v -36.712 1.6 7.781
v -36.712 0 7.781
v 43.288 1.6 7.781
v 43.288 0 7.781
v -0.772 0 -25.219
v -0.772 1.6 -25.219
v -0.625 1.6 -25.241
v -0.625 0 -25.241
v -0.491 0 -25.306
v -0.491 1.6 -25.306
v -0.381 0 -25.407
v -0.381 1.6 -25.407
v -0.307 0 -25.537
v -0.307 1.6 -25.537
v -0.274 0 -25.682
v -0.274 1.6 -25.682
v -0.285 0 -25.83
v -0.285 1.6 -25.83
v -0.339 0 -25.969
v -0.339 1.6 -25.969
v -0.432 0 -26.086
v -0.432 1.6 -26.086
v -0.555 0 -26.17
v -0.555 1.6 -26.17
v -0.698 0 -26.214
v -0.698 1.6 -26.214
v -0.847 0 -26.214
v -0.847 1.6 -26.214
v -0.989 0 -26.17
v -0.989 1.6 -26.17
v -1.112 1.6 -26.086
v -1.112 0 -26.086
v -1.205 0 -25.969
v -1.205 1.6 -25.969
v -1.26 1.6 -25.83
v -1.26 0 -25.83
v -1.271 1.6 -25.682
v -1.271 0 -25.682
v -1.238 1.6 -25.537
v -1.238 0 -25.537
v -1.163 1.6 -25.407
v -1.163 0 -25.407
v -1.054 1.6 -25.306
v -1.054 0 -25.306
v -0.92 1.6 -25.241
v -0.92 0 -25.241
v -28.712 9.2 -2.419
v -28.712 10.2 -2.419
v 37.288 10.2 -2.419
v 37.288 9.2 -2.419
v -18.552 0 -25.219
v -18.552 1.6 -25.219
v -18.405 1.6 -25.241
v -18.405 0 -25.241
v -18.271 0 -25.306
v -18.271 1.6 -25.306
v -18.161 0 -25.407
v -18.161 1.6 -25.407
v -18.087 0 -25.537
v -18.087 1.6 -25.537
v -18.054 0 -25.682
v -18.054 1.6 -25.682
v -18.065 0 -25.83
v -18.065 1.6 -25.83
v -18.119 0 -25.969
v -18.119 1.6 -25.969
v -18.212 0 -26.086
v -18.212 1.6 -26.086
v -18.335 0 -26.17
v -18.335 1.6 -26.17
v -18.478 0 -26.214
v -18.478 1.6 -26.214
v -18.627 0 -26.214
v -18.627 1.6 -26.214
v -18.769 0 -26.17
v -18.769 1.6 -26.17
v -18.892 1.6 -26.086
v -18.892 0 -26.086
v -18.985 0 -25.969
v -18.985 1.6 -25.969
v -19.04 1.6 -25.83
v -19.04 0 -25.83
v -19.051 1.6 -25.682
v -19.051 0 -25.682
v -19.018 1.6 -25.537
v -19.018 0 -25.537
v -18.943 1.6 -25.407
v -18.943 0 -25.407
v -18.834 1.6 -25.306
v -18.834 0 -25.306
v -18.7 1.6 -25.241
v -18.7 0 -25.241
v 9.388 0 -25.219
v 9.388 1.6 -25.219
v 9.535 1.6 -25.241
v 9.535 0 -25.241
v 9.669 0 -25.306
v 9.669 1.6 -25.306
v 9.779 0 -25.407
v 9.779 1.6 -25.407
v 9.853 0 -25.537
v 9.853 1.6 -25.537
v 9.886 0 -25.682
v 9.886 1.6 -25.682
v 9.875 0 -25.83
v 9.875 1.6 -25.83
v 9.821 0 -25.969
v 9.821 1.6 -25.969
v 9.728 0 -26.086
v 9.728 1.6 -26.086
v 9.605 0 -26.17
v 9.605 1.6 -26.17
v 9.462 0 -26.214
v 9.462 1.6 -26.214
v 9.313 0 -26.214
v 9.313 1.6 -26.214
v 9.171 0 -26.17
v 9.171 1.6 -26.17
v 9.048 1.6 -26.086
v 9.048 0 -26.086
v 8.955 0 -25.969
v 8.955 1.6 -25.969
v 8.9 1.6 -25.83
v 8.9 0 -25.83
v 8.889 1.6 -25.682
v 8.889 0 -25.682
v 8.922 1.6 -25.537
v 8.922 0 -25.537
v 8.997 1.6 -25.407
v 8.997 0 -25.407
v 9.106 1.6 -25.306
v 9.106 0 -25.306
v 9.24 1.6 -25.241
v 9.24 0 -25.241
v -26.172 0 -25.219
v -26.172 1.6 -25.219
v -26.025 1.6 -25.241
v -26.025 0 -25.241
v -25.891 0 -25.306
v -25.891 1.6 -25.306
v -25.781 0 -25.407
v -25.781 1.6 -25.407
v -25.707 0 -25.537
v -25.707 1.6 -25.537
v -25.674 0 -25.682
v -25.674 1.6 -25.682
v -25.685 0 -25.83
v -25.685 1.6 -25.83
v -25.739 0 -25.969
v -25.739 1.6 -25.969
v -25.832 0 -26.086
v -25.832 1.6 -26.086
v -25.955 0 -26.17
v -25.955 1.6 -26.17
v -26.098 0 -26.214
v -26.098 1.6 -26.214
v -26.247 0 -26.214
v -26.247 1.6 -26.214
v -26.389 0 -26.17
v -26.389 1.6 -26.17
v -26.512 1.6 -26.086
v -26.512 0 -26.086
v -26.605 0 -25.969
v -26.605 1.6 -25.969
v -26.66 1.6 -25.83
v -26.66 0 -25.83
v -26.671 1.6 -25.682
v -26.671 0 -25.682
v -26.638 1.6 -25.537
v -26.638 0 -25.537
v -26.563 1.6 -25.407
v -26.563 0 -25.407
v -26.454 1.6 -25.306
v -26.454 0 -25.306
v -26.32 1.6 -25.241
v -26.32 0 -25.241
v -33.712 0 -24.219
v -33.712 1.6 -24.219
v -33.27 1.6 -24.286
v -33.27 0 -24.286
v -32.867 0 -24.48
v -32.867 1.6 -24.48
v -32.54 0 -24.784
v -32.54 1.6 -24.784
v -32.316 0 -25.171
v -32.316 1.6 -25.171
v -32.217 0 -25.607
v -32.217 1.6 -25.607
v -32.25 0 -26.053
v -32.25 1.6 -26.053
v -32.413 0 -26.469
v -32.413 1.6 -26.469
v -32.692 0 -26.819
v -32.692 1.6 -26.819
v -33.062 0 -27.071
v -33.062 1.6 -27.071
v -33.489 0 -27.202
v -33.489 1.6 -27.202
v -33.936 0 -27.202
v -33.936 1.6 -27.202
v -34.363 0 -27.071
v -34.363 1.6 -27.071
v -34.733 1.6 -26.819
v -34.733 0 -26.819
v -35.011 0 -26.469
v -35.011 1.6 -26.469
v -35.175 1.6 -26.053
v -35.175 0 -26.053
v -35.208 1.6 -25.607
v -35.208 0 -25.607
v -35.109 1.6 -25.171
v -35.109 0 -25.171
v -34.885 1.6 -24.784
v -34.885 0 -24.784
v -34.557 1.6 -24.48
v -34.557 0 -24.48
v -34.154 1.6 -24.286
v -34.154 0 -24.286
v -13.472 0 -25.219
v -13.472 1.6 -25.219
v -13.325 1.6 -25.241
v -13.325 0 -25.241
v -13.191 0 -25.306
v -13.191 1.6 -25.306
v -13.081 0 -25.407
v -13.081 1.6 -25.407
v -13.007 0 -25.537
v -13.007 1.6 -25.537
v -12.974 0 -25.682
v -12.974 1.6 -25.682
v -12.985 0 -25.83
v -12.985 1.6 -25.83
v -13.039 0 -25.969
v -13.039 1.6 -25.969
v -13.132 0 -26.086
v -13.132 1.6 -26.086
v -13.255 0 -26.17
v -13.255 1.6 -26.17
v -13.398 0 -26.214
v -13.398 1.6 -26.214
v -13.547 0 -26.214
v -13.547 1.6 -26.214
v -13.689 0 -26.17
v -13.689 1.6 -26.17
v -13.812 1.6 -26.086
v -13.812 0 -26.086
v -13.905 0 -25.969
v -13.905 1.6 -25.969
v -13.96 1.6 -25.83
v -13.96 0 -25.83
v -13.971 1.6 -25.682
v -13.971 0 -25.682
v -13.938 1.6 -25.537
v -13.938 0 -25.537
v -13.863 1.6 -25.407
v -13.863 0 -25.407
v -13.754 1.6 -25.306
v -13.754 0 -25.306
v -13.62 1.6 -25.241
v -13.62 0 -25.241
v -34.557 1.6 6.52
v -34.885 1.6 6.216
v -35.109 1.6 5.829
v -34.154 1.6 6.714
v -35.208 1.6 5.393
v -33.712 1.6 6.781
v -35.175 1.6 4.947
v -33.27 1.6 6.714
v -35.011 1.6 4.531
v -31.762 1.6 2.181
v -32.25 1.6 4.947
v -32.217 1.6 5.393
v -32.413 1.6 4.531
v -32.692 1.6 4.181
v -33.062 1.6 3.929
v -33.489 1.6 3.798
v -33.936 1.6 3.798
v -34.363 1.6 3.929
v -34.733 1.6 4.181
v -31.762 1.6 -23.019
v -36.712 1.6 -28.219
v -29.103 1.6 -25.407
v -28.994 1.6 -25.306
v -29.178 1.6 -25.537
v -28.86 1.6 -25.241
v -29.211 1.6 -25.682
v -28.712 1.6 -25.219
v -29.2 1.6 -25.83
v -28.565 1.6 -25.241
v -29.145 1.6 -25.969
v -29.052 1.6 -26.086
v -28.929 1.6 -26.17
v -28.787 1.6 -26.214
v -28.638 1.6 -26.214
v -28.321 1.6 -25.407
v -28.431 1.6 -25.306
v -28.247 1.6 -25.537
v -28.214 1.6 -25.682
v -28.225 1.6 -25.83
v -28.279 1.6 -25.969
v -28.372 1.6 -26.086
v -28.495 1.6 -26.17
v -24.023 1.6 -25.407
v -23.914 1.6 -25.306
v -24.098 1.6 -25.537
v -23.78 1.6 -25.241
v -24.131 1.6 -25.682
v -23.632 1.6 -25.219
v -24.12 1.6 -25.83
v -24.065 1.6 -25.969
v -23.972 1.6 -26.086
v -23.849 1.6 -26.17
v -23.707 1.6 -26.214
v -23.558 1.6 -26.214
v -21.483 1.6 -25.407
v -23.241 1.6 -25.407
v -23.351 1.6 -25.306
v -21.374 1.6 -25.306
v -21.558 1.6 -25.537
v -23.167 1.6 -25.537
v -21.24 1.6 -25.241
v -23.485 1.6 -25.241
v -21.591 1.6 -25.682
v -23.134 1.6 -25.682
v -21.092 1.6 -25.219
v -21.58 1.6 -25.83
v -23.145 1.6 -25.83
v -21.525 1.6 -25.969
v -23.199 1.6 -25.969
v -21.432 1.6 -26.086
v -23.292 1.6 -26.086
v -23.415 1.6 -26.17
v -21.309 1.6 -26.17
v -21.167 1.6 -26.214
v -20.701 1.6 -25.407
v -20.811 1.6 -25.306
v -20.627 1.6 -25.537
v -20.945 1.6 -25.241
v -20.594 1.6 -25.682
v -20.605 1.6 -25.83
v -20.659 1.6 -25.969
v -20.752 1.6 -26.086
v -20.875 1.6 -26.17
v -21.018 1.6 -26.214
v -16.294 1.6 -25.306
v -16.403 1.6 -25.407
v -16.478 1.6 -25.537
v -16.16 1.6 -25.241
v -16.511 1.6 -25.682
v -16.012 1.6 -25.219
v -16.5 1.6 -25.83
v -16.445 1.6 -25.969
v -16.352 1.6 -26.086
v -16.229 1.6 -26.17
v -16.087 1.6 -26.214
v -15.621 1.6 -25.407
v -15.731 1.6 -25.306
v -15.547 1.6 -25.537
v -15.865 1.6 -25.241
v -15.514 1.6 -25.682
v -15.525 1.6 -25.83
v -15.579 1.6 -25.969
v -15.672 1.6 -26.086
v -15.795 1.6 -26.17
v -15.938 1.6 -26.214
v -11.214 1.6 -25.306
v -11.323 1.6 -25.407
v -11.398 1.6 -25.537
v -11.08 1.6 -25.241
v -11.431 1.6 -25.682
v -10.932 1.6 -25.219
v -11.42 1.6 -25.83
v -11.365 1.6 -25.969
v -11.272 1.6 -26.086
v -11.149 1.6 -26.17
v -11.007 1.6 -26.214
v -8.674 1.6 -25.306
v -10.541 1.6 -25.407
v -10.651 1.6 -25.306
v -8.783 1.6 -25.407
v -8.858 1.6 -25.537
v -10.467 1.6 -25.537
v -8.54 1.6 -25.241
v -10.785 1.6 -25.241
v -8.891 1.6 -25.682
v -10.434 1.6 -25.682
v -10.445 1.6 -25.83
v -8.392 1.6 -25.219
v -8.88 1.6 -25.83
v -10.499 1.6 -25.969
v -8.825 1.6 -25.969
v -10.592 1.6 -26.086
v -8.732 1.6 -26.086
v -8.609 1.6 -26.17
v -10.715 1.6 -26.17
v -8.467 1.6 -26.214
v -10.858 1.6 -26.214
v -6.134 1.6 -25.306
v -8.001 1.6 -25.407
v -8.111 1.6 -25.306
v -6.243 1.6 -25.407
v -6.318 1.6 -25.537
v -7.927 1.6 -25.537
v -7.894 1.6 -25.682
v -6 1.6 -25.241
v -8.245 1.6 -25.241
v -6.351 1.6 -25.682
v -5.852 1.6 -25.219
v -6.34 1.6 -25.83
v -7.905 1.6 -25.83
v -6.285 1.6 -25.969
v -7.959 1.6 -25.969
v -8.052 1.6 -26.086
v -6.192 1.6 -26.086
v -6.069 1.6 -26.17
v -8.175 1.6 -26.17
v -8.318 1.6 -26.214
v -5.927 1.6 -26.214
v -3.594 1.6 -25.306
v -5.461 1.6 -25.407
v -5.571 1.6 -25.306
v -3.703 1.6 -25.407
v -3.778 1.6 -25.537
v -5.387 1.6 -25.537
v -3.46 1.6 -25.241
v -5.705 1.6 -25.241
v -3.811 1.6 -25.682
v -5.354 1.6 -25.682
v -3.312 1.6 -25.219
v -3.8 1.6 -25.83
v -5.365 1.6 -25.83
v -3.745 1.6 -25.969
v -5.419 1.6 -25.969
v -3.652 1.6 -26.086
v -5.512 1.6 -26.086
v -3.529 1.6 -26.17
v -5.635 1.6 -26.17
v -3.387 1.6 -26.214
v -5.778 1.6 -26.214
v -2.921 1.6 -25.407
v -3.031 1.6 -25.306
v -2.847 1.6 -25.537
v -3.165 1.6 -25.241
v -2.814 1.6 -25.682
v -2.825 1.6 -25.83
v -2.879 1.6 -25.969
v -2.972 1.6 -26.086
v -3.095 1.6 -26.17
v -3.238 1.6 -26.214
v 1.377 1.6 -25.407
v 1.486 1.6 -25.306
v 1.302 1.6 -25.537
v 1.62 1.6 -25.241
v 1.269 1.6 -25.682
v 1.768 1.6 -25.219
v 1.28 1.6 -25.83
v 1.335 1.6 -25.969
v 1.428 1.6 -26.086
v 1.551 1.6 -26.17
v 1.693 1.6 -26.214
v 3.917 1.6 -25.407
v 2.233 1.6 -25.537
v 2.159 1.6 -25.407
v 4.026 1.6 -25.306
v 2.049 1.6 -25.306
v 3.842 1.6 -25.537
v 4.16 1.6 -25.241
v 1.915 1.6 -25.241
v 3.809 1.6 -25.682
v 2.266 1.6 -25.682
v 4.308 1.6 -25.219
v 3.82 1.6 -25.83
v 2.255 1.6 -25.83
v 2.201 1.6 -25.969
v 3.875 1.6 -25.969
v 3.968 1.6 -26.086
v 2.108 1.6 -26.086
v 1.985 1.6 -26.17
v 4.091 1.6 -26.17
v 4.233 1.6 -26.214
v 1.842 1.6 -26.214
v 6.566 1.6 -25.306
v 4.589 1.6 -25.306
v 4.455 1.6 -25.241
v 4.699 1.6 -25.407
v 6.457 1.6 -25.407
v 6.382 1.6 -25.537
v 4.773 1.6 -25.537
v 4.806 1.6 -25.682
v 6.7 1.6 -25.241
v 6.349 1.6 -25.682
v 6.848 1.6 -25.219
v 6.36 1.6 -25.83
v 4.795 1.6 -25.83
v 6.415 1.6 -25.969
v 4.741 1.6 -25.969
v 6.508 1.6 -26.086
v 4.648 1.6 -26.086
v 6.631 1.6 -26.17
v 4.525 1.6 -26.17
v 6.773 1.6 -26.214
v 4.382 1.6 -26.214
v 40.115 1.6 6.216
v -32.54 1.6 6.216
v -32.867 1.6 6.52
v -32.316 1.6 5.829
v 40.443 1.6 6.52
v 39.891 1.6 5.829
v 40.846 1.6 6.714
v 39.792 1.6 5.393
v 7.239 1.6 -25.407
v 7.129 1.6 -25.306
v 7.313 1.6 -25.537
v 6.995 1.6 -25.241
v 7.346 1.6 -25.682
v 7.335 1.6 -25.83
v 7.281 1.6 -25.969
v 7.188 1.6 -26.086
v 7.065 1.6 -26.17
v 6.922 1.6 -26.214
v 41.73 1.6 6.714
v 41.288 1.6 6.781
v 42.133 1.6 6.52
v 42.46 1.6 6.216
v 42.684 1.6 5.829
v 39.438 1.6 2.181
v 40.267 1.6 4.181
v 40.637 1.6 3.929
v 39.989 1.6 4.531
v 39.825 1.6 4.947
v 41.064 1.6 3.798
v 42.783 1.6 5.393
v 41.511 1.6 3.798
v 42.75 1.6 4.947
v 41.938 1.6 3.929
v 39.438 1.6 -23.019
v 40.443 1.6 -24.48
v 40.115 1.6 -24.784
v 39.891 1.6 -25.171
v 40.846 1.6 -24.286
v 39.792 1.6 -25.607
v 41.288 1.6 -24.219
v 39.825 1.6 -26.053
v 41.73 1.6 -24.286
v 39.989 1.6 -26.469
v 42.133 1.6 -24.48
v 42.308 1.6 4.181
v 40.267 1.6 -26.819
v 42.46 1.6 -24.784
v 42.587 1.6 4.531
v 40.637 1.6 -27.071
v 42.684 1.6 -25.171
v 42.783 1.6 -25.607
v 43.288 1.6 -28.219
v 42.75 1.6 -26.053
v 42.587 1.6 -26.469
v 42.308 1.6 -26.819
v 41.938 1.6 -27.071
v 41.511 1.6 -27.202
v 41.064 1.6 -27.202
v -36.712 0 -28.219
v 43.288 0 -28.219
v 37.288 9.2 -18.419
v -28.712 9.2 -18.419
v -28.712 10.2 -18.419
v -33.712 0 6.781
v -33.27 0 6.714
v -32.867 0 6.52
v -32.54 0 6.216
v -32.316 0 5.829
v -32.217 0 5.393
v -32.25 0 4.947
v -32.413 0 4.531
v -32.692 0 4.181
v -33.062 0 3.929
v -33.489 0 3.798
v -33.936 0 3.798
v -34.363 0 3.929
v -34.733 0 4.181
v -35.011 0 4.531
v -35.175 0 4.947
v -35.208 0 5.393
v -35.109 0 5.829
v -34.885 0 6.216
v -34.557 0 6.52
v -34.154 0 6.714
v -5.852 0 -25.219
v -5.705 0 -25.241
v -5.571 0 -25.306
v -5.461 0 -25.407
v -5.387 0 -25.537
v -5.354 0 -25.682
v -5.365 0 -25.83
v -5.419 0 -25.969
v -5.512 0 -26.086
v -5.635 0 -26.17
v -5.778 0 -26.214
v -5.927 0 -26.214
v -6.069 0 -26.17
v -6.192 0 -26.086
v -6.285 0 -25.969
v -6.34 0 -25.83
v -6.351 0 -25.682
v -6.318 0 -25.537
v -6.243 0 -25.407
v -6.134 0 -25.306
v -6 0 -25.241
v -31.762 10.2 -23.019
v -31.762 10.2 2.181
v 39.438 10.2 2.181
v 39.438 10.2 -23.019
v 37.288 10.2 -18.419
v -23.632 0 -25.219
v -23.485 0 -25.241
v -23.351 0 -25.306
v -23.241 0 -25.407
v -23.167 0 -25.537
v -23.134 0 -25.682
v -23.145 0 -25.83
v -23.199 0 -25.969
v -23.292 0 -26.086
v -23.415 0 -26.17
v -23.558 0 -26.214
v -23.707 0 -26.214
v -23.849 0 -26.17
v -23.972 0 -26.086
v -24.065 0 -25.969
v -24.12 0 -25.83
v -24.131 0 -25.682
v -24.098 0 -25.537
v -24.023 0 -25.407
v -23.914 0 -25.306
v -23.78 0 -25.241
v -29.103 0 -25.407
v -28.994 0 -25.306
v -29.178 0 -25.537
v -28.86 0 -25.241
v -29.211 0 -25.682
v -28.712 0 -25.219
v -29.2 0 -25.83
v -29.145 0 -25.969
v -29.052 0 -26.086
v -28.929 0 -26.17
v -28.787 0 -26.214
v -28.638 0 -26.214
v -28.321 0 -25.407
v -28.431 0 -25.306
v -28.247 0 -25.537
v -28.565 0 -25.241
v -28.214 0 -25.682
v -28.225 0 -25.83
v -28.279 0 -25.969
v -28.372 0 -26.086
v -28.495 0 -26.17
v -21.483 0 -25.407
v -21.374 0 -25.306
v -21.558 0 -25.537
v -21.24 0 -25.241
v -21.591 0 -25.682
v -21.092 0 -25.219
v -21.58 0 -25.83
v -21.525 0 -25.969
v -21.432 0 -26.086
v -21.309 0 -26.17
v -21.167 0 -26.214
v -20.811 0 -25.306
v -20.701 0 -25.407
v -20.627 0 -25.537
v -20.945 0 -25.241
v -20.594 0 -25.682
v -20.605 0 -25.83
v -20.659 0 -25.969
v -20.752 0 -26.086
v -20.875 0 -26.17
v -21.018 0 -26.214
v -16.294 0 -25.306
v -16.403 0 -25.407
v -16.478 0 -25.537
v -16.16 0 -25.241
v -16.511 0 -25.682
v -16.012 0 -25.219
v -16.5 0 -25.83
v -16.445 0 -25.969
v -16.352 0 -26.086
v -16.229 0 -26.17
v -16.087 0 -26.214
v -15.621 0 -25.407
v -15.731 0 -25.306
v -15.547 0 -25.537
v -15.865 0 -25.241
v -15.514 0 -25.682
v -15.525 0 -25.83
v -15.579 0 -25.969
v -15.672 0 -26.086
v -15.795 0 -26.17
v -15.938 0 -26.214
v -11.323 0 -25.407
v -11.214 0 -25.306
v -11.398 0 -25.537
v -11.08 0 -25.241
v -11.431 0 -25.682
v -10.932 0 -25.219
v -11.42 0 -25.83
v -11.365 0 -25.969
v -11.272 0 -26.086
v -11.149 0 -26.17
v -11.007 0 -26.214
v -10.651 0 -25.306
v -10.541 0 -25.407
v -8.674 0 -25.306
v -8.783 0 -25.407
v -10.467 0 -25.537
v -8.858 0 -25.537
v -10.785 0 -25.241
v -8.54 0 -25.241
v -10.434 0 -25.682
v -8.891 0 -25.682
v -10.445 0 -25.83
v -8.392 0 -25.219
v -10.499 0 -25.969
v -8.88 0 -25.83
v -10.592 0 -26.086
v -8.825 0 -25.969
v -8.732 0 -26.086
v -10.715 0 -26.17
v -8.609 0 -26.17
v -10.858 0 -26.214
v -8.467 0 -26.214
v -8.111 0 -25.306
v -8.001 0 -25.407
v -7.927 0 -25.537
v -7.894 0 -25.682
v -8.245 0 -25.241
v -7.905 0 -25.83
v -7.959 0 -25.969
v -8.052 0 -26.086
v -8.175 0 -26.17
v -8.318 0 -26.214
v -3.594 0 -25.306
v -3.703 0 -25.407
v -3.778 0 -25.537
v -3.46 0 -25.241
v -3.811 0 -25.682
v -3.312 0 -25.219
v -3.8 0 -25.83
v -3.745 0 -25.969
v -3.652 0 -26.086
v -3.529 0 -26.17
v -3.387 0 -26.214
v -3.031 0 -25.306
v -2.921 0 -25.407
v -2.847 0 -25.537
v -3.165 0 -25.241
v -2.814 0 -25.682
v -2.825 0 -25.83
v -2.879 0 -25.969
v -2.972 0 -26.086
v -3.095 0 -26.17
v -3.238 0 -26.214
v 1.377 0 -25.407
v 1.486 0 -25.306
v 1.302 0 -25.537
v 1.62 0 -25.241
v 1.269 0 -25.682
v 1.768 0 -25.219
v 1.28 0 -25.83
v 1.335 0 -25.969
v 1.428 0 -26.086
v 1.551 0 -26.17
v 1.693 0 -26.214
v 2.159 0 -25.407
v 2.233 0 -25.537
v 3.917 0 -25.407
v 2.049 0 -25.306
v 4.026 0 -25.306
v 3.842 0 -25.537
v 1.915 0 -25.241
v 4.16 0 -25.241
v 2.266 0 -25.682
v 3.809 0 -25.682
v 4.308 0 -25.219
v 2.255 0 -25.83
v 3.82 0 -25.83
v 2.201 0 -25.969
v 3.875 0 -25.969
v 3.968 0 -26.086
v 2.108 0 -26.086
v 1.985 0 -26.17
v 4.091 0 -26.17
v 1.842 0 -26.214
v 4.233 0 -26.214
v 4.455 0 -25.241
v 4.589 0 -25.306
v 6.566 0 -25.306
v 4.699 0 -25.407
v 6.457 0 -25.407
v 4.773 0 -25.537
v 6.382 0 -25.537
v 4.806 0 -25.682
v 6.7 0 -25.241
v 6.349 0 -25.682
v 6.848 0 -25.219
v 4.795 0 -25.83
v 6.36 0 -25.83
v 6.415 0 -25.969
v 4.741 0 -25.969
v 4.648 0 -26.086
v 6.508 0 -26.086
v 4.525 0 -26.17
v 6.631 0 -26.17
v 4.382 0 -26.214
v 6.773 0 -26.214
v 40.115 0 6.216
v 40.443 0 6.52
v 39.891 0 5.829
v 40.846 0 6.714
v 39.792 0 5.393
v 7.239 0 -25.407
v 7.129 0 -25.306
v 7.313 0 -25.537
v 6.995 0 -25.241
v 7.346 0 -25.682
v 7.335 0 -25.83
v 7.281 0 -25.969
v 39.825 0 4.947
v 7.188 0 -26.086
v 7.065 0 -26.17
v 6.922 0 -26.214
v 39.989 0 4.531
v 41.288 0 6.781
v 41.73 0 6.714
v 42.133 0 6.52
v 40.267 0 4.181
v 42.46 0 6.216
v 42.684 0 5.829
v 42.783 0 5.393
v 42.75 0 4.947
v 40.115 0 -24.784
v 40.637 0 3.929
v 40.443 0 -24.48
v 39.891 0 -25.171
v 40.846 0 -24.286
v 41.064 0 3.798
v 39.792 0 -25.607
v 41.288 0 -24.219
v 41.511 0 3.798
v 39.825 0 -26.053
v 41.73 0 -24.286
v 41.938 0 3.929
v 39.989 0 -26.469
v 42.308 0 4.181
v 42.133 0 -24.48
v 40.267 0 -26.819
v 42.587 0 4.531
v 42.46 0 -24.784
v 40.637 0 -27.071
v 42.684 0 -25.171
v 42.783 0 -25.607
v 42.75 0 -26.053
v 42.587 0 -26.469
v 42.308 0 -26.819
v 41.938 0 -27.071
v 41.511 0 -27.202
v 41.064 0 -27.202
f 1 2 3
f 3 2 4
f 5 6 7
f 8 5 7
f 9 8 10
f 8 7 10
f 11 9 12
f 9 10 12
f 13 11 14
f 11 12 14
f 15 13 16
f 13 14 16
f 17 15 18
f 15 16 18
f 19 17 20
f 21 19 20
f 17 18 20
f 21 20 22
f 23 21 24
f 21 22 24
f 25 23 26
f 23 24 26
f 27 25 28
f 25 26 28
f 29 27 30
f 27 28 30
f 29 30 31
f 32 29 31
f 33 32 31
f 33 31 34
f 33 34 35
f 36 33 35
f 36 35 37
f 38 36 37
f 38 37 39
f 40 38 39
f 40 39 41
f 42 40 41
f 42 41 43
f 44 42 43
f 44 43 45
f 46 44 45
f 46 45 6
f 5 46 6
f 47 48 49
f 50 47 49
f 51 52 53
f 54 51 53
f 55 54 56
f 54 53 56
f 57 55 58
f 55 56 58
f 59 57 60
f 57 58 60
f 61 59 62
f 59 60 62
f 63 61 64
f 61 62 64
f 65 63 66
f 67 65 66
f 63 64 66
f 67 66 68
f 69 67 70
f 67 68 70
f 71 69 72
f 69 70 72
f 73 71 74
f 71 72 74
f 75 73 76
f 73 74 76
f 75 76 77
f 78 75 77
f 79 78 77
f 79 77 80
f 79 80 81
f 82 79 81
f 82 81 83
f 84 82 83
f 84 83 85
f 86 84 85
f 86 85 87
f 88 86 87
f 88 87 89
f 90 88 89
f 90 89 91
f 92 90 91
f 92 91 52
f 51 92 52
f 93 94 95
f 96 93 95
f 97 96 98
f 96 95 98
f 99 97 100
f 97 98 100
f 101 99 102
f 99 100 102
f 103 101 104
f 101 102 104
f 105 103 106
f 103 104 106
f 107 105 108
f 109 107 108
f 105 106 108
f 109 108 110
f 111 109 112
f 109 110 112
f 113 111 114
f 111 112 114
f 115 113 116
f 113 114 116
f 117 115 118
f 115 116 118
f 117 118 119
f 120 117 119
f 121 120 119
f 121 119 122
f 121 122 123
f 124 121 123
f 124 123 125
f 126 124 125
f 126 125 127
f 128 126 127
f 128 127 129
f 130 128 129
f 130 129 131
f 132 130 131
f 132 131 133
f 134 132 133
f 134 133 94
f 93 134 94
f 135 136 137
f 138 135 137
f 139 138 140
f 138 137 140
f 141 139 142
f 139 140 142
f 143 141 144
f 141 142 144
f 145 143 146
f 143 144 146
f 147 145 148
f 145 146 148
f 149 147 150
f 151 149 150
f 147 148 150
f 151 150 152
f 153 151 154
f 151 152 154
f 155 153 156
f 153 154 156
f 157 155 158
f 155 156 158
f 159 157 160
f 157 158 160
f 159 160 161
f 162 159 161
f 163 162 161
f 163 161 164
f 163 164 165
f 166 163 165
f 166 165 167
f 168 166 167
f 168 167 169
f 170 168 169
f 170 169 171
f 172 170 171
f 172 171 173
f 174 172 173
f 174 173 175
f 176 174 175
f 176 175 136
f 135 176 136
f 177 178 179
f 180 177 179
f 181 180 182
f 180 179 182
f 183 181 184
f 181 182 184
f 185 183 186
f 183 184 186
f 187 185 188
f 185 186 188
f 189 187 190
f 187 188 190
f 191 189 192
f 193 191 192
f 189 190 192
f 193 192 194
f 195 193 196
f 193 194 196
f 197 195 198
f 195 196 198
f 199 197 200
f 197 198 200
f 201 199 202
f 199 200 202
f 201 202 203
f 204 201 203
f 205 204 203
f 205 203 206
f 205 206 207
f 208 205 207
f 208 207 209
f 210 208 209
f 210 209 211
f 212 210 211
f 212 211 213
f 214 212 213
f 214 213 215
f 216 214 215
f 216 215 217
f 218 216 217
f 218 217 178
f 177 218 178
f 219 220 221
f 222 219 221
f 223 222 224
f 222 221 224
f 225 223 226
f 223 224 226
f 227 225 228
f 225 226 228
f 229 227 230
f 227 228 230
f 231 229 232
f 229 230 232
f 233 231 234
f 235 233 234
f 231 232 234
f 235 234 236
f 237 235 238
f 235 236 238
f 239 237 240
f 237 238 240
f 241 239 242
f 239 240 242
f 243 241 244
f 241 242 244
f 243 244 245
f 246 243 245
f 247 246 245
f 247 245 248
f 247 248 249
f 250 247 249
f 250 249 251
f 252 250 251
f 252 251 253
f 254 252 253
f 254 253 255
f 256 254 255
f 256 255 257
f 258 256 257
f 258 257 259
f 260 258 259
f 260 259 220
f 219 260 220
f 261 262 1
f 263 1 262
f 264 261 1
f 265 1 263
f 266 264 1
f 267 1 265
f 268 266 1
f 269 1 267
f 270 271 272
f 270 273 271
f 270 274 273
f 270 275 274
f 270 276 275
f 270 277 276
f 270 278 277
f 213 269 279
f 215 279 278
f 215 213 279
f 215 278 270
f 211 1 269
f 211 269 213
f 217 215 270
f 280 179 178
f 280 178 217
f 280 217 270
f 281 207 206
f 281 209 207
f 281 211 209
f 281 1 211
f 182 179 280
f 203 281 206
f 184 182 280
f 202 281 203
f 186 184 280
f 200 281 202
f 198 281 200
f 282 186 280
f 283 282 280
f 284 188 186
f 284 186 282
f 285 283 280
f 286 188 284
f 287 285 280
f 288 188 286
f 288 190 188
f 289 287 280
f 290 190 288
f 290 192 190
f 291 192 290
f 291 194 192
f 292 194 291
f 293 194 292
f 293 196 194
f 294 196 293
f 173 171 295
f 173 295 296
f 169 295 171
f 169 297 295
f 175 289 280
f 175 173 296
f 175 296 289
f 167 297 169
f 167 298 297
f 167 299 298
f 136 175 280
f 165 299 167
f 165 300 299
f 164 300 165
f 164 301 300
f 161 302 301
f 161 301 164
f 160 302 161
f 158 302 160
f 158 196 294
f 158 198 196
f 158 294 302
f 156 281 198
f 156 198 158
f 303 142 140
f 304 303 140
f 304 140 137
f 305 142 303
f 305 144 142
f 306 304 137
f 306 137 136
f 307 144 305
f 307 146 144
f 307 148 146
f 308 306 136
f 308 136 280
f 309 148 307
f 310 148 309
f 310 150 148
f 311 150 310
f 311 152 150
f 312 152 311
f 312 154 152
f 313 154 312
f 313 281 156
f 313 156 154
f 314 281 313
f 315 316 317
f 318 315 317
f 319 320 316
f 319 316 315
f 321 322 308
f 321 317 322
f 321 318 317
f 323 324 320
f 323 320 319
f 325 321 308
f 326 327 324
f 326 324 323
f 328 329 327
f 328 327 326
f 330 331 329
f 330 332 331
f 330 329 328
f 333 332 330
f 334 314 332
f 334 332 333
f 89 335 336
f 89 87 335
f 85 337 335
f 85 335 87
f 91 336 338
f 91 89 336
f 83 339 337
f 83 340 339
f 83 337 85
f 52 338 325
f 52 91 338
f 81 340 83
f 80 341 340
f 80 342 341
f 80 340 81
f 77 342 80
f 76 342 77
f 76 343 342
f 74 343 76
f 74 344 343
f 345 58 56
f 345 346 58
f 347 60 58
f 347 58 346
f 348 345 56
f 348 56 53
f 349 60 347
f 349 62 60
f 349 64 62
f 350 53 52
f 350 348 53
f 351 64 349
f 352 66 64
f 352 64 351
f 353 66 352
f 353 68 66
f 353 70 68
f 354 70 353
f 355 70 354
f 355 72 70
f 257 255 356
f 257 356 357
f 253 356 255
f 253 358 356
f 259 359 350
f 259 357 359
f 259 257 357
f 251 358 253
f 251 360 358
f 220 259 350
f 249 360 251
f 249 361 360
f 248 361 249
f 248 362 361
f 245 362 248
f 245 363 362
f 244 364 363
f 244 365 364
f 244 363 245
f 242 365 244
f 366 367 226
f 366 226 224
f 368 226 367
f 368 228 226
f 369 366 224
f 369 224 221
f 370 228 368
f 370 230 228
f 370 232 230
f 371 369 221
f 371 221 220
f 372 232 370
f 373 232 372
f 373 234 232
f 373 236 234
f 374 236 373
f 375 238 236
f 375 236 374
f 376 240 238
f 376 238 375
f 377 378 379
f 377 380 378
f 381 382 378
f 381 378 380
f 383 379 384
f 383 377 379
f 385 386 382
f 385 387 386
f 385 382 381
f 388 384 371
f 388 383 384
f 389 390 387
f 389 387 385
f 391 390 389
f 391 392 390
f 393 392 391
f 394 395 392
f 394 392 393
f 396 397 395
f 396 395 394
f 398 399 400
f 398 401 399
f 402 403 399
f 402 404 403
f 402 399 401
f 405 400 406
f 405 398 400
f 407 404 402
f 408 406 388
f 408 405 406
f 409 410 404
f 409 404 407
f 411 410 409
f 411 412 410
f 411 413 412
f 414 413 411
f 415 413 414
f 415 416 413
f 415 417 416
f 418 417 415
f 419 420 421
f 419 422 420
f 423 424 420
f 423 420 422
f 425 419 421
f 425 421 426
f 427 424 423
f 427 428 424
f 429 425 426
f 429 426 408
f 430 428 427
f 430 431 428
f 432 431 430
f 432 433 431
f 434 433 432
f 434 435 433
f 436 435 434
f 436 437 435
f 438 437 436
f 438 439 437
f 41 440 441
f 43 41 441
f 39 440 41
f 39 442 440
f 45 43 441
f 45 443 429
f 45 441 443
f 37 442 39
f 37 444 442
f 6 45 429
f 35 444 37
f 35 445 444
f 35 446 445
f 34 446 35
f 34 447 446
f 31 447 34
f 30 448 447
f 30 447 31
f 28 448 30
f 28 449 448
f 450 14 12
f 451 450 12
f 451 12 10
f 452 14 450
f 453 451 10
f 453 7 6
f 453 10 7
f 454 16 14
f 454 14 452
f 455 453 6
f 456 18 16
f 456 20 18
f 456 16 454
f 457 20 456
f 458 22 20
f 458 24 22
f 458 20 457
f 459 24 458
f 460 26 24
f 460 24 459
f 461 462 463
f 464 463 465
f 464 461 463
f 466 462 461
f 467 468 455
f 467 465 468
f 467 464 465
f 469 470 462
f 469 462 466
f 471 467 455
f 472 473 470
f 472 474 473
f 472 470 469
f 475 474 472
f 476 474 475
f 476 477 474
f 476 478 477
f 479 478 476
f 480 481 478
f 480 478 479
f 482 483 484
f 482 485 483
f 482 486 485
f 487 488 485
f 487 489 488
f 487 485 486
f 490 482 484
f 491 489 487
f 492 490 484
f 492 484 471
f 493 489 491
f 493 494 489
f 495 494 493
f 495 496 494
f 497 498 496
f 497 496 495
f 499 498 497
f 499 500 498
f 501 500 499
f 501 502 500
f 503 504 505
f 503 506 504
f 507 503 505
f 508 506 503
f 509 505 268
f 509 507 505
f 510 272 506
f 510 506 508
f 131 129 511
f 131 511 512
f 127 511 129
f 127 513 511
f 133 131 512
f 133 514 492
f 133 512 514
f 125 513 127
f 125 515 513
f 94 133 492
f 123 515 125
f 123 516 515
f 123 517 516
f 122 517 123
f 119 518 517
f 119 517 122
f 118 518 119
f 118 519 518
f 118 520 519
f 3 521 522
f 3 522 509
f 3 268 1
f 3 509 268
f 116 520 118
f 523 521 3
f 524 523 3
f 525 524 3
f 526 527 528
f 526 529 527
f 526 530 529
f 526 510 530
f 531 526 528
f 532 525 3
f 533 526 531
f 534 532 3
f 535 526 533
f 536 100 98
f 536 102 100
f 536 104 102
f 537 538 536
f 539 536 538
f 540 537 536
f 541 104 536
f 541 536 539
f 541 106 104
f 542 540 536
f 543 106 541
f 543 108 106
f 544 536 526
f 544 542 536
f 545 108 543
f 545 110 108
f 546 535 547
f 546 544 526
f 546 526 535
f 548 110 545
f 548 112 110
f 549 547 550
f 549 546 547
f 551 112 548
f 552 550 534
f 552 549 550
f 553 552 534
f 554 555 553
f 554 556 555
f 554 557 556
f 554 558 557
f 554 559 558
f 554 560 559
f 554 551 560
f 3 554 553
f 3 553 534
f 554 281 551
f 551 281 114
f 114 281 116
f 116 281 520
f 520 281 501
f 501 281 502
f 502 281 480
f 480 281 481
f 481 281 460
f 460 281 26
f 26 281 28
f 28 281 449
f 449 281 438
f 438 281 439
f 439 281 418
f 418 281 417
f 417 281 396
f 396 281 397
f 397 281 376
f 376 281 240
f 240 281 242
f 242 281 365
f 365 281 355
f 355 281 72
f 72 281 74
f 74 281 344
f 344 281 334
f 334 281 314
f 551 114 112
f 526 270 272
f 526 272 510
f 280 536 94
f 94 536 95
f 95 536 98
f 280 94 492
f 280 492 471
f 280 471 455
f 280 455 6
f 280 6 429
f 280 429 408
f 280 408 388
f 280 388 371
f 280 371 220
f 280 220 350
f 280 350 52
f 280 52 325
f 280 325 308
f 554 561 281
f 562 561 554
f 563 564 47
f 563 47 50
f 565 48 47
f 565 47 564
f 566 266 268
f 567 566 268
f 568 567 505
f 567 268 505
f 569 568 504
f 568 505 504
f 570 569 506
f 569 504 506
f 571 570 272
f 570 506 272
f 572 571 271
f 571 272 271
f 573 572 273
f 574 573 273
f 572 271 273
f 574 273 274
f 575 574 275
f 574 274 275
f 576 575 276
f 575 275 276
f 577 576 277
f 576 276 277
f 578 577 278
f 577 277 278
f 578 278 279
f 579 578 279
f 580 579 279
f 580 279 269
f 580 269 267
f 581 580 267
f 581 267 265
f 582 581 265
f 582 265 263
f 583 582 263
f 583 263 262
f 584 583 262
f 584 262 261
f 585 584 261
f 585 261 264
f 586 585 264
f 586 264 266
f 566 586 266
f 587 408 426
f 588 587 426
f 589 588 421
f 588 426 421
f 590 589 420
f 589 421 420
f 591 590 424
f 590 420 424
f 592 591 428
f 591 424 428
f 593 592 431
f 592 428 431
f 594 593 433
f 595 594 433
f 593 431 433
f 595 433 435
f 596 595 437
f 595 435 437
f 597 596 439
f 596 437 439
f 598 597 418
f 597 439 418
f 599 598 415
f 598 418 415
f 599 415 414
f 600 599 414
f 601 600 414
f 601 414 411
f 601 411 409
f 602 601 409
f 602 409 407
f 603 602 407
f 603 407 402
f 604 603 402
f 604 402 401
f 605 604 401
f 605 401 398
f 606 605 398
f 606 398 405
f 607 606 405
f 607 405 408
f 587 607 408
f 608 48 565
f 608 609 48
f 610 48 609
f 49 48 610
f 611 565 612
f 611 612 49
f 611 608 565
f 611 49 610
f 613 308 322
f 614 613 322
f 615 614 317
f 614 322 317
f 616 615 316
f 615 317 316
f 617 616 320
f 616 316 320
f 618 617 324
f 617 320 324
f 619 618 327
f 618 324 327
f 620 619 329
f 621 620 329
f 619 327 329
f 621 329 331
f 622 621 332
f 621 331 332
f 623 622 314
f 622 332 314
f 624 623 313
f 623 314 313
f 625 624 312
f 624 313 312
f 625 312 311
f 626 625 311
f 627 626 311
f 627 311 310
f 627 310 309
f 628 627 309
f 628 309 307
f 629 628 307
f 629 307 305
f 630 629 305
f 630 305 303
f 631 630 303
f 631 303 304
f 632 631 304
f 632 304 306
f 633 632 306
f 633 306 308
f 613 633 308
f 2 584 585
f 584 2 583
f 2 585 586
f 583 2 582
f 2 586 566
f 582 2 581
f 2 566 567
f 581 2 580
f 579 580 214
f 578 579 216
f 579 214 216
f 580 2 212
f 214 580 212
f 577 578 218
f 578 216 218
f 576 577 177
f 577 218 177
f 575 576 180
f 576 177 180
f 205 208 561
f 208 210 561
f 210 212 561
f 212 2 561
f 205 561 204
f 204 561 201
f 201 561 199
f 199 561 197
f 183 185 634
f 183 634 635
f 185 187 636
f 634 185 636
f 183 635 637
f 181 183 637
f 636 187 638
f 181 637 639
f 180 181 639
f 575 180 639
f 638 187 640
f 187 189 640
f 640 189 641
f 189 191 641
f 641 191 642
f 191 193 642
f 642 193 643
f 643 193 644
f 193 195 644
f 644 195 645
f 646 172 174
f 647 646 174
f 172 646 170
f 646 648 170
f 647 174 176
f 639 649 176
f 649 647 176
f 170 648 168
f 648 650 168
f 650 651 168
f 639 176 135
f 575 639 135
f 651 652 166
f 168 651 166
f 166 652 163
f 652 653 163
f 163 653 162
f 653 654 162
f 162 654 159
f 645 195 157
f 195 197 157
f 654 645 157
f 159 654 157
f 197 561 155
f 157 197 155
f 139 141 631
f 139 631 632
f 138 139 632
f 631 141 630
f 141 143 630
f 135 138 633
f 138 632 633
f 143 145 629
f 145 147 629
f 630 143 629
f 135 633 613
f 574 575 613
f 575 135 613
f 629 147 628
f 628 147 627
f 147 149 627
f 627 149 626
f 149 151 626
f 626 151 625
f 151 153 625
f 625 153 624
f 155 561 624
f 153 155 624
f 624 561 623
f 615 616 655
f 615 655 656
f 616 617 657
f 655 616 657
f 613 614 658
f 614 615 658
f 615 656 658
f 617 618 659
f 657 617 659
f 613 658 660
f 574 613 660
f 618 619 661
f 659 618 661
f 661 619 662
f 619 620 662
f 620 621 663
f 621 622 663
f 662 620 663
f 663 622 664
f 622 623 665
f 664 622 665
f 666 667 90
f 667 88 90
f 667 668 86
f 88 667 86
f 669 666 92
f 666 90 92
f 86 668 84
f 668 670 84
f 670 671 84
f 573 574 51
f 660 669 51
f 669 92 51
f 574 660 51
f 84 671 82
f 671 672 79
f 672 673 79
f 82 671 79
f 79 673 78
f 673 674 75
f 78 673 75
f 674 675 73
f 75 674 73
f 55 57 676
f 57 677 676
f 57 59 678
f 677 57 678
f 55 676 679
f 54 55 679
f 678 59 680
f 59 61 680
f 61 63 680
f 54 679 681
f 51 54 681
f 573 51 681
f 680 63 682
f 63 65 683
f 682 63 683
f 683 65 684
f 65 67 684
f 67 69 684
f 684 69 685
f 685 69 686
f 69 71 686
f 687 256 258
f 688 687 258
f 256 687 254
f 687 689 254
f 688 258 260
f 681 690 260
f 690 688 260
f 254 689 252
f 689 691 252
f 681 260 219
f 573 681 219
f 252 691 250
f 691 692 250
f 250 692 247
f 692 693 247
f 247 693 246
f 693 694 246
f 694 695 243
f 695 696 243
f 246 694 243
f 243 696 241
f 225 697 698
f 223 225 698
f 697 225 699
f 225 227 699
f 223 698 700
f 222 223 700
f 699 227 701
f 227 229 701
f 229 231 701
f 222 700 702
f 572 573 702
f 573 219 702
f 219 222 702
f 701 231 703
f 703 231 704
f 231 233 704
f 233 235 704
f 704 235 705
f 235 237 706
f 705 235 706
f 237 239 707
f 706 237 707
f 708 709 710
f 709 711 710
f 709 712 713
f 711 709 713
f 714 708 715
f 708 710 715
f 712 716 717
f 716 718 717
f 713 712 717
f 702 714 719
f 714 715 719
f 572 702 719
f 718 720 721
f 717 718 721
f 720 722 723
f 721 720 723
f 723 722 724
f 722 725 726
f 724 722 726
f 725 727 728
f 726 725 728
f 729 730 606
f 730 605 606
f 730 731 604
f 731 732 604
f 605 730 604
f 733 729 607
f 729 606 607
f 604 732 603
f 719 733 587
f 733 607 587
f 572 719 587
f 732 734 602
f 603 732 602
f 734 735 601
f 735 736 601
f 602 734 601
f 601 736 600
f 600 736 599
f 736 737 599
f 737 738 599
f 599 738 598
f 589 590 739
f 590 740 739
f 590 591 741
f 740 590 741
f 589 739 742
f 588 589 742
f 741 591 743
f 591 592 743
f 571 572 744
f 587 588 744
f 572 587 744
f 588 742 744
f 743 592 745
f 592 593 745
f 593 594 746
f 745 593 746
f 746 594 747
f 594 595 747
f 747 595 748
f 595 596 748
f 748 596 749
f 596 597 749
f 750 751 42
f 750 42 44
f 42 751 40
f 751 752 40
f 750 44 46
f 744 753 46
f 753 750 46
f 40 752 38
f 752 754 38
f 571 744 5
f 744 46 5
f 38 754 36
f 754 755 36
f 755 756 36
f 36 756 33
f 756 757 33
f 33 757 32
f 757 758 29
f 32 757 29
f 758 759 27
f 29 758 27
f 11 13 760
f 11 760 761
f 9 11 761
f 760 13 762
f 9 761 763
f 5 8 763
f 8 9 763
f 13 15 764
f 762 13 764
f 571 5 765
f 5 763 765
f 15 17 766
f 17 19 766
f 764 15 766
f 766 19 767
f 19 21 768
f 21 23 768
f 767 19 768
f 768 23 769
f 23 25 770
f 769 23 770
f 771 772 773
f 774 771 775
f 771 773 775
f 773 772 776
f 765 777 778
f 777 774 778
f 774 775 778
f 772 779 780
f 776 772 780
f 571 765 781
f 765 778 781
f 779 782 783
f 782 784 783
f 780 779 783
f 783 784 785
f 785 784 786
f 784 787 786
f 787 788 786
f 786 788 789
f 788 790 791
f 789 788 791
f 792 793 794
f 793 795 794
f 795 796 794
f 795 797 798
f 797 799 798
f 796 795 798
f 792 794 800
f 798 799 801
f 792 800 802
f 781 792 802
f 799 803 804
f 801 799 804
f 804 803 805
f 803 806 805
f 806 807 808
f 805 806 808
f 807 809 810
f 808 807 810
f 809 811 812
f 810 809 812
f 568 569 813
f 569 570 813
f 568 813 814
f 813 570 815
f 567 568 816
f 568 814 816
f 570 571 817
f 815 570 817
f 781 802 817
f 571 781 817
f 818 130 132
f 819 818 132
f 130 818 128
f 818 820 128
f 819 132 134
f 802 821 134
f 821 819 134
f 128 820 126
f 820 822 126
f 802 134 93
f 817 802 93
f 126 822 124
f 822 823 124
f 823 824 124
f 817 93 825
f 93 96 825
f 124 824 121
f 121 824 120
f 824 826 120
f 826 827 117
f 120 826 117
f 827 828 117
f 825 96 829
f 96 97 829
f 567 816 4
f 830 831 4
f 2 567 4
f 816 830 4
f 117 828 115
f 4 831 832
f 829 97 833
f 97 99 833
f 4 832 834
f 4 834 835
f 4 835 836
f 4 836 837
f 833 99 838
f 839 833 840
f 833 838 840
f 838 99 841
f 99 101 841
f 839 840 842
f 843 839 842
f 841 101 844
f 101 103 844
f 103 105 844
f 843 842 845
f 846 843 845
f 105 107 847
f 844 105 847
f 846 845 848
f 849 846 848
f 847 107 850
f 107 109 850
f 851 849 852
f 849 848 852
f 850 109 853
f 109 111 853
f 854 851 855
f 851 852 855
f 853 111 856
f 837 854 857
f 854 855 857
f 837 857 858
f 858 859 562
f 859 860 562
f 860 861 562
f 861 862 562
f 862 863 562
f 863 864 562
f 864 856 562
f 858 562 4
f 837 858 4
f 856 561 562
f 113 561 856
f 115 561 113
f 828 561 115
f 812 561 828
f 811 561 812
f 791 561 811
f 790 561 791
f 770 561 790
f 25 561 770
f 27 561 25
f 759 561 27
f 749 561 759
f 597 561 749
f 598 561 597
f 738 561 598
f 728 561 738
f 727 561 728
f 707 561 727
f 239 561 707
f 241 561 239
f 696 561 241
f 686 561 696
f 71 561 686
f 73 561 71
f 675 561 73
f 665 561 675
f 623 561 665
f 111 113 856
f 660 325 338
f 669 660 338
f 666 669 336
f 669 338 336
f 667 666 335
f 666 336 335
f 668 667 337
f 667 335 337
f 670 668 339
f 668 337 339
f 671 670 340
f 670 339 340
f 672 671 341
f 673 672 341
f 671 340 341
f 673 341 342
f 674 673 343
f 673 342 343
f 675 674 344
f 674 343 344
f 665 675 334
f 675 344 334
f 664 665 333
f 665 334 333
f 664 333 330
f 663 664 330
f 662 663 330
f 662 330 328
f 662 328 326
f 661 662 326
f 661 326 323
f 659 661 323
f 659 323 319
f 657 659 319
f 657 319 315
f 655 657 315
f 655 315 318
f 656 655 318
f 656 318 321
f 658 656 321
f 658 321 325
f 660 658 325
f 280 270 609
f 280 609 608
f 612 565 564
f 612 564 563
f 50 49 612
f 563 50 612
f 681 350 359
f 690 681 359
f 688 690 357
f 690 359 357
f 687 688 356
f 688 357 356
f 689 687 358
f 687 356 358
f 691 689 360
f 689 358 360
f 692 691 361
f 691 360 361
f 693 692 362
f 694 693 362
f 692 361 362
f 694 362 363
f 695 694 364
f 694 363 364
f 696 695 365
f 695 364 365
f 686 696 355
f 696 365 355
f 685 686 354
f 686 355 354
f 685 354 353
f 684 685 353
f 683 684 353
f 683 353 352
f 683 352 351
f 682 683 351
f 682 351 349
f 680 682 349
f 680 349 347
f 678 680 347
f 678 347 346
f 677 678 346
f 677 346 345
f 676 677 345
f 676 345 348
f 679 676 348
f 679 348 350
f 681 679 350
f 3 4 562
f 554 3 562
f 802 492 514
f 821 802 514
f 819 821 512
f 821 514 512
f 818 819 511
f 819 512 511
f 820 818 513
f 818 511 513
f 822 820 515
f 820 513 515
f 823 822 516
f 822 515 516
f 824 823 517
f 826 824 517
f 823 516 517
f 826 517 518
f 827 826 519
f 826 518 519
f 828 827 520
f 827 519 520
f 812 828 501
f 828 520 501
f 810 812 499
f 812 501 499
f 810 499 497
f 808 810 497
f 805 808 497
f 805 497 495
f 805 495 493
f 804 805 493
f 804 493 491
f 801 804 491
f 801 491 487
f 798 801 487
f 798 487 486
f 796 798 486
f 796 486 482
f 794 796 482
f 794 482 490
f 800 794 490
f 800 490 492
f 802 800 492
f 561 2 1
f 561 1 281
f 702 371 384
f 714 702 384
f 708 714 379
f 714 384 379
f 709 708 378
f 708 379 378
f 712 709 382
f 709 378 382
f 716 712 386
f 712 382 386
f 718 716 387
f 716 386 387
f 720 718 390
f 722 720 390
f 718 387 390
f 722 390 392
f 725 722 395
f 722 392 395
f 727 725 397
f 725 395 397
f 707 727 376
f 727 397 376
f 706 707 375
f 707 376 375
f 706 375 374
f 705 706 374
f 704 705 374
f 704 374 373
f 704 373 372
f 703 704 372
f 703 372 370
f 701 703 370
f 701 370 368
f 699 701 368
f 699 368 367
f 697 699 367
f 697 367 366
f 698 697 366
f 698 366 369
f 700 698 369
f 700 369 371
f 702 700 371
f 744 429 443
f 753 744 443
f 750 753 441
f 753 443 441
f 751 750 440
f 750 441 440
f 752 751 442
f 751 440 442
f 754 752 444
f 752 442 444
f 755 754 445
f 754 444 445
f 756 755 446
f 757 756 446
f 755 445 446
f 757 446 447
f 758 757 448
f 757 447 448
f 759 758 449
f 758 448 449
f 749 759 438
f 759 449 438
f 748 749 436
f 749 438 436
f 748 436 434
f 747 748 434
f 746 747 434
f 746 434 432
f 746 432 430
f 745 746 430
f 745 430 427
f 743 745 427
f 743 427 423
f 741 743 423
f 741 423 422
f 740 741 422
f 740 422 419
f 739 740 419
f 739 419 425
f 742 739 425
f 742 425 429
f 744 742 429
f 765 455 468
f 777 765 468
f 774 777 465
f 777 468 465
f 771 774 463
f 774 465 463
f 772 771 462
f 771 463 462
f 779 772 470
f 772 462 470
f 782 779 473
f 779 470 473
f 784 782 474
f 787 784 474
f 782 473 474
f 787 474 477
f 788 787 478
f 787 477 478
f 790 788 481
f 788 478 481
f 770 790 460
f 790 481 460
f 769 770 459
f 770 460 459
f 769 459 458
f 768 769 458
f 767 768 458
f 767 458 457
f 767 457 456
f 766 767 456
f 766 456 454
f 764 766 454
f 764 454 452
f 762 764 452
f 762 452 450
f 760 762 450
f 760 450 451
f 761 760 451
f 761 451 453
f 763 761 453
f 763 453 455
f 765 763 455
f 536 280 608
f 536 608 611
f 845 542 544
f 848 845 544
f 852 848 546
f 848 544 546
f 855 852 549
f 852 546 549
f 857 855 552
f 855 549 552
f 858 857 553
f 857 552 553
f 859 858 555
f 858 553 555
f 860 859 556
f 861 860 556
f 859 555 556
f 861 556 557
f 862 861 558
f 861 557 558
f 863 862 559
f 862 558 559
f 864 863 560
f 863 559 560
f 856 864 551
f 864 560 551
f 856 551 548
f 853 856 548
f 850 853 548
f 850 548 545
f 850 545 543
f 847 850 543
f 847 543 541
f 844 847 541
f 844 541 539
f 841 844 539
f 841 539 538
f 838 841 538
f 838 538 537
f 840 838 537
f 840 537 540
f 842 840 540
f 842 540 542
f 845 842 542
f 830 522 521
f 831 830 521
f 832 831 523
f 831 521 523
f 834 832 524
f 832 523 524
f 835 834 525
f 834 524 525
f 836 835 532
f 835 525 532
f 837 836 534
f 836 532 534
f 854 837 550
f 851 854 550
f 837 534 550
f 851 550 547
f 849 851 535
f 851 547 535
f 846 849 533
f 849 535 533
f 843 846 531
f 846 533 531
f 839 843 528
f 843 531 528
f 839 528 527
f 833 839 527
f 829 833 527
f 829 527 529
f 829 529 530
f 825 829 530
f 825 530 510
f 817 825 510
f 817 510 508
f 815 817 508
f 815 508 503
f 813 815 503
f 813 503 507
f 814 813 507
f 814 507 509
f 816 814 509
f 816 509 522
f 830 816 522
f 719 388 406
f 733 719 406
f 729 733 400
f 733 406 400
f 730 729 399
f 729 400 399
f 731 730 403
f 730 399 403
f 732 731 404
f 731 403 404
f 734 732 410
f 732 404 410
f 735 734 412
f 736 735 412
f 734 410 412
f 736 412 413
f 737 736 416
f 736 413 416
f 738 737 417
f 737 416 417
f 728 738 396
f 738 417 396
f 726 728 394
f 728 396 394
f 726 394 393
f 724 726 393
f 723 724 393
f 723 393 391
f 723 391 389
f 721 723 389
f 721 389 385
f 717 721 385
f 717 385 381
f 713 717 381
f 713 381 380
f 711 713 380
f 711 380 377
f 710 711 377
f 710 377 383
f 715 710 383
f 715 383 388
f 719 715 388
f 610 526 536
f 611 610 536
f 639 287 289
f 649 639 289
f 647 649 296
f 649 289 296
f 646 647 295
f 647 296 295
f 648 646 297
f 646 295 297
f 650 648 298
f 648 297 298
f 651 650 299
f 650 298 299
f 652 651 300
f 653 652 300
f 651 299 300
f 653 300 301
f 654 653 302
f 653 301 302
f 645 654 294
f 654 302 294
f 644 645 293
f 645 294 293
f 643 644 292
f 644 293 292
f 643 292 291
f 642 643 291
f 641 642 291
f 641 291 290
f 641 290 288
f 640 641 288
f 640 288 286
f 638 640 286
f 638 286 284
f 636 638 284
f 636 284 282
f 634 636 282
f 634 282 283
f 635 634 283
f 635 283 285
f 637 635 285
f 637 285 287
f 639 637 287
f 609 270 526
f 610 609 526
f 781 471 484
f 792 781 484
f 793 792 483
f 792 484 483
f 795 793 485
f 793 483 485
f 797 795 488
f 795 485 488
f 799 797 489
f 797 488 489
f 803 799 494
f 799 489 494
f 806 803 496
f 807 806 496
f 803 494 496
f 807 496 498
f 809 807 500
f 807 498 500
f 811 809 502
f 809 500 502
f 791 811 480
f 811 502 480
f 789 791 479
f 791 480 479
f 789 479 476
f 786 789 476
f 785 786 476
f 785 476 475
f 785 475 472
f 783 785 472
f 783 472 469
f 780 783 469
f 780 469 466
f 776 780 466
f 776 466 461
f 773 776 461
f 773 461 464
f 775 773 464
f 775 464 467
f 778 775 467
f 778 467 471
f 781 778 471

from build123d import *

# Parameters (mm, degrees)
SKETCH1_W           = 80
SKETCH1_H           = 36
BOSS_EXTRUDE1_DEPTH = 1.6
SKETCH2_W           = 71.2
SKETCH2_H           = 25.2
BOSS_EXTRUDE2_DEPTH = 8.6
SKETCH3_R           = 1.5
CUT_EXTRUDE3_DEPTH  = 13.2
SKETCH6_W           = 66
SKETCH6_H           = 16
CUT_EXTRUDE4_DEPTH  = 1
SKETCH7_R           = 0.5
CUT_EXTRUDE5_DEPTH  = 21


with BuildPart() as part:
    # Sketch1 → Boss-Extrude1 (new body)
    with BuildSketch(Plane(origin=(0, 0, 0), x_dir=(1, 0, 0), z_dir=(0, 1, 0))):
        with Locations((3.287671233, 10.219178082)):
            Rectangle(SKETCH1_W, SKETCH1_H)
    extrude(amount=BOSS_EXTRUDE1_DEPTH)

    # Sketch2 → Boss-Extrude2 (add)
    with BuildSketch(Plane(origin=(0, 1.6, 0), x_dir=(1, 0, 0), z_dir=(0, 1, 0))):
        with Locations((3.837671233, 10.419178082)):
            Rectangle(SKETCH2_W, SKETCH2_H)
    extrude(amount=BOSS_EXTRUDE2_DEPTH)

    # Sketch3 → Cut-Extrude3 (cut)
    with BuildSketch(Plane(origin=(0, 1.6, 0), x_dir=(1, 0, 0), z_dir=(0, 1, 0))):
        with Locations(Location((-33.712328767, 25.719178082, 0), (0, 0, 270))):
            Circle(SKETCH3_R)
        with Locations(Location((41.287671233, 25.719178082, 0), (0, 0, 270))):
            Circle(SKETCH3_R)
        with Locations(Location((-33.712328767, -5.280821918, 0), (0, 0, 270))):
            Circle(SKETCH3_R)
        with Locations(Location((41.287671233, -5.280821918, 0), (0, 0, 270))):
            Circle(SKETCH3_R)
    extrude(amount=-CUT_EXTRUDE3_DEPTH, mode=Mode.SUBTRACT)

    # Sketch6 → Cut-Extrude4 (cut)
    with BuildSketch(Plane(origin=(0, 10.2, 0), x_dir=(1, 0, 0), z_dir=(0, 1, 0))):
        with Locations((4.287671233, 10.419178082)):
            Rectangle(SKETCH6_W, SKETCH6_H)
    extrude(amount=-CUT_EXTRUDE4_DEPTH, mode=Mode.SUBTRACT)

    # Sketch7 → Cut-Extrude5 (cut)
    with BuildSketch(Plane(origin=(0, 1.6, 0), x_dir=(1, 0, 0), z_dir=(0, 1, 0))):
        with Locations(Location((-28.712328767, 25.719178082, 0), (0, 0, 270))):
            Circle(SKETCH7_R)
        with Locations(Location((-26.172328767, 25.719178082, 0), (0, 0, 270))):
            Circle(SKETCH7_R)
        with Locations(Location((-23.632328767, 25.719178082, 0), (0, 0, 270))):
            Circle(SKETCH7_R)
        with Locations(Location((-21.092328767, 25.719178082, 0), (0, 0, 270))):
            Circle(SKETCH7_R)
        with Locations(Location((-18.552328767, 25.719178082, 0), (0, 0, 270))):
            Circle(SKETCH7_R)
        with Locations(Location((-16.012328767, 25.719178082, 0), (0, 0, 270))):
            Circle(SKETCH7_R)
        with Locations(Location((-13.472328767, 25.719178082, 0), (0, 0, 270))):
            Circle(SKETCH7_R)
        with Locations(Location((-10.932328767, 25.719178082, 0), (0, 0, 270))):
            Circle(SKETCH7_R)
        with Locations(Location((-8.392328767, 25.719178082, 0), (0, 0, 270))):
            Circle(SKETCH7_R)
        with Locations(Location((-5.852328767, 25.719178082, 0), (0, 0, 270))):
            Circle(SKETCH7_R)
        with Locations(Location((-3.312328767, 25.719178082, 0), (0, 0, 270))):
            Circle(SKETCH7_R)
        with Locations(Location((-0.772328767, 25.719178082, 0), (0, 0, 270))):
            Circle(SKETCH7_R)
        with Locations(Location((1.767671233, 25.719178082, 0), (0, 0, 270))):
            Circle(SKETCH7_R)
        with Locations(Location((4.307671233, 25.719178082, 0), (0, 0, 270))):
            Circle(SKETCH7_R)
        with Locations(Location((6.847671233, 25.719178082, 0), (0, 0, 270))):
            Circle(SKETCH7_R)
        with Locations(Location((9.387671233, 25.719178082, 0), (0, 0, 270))):
            Circle(SKETCH7_R)
    extrude(amount=-CUT_EXTRUDE5_DEPTH, mode=Mode.SUBTRACT)


solid = part.part
